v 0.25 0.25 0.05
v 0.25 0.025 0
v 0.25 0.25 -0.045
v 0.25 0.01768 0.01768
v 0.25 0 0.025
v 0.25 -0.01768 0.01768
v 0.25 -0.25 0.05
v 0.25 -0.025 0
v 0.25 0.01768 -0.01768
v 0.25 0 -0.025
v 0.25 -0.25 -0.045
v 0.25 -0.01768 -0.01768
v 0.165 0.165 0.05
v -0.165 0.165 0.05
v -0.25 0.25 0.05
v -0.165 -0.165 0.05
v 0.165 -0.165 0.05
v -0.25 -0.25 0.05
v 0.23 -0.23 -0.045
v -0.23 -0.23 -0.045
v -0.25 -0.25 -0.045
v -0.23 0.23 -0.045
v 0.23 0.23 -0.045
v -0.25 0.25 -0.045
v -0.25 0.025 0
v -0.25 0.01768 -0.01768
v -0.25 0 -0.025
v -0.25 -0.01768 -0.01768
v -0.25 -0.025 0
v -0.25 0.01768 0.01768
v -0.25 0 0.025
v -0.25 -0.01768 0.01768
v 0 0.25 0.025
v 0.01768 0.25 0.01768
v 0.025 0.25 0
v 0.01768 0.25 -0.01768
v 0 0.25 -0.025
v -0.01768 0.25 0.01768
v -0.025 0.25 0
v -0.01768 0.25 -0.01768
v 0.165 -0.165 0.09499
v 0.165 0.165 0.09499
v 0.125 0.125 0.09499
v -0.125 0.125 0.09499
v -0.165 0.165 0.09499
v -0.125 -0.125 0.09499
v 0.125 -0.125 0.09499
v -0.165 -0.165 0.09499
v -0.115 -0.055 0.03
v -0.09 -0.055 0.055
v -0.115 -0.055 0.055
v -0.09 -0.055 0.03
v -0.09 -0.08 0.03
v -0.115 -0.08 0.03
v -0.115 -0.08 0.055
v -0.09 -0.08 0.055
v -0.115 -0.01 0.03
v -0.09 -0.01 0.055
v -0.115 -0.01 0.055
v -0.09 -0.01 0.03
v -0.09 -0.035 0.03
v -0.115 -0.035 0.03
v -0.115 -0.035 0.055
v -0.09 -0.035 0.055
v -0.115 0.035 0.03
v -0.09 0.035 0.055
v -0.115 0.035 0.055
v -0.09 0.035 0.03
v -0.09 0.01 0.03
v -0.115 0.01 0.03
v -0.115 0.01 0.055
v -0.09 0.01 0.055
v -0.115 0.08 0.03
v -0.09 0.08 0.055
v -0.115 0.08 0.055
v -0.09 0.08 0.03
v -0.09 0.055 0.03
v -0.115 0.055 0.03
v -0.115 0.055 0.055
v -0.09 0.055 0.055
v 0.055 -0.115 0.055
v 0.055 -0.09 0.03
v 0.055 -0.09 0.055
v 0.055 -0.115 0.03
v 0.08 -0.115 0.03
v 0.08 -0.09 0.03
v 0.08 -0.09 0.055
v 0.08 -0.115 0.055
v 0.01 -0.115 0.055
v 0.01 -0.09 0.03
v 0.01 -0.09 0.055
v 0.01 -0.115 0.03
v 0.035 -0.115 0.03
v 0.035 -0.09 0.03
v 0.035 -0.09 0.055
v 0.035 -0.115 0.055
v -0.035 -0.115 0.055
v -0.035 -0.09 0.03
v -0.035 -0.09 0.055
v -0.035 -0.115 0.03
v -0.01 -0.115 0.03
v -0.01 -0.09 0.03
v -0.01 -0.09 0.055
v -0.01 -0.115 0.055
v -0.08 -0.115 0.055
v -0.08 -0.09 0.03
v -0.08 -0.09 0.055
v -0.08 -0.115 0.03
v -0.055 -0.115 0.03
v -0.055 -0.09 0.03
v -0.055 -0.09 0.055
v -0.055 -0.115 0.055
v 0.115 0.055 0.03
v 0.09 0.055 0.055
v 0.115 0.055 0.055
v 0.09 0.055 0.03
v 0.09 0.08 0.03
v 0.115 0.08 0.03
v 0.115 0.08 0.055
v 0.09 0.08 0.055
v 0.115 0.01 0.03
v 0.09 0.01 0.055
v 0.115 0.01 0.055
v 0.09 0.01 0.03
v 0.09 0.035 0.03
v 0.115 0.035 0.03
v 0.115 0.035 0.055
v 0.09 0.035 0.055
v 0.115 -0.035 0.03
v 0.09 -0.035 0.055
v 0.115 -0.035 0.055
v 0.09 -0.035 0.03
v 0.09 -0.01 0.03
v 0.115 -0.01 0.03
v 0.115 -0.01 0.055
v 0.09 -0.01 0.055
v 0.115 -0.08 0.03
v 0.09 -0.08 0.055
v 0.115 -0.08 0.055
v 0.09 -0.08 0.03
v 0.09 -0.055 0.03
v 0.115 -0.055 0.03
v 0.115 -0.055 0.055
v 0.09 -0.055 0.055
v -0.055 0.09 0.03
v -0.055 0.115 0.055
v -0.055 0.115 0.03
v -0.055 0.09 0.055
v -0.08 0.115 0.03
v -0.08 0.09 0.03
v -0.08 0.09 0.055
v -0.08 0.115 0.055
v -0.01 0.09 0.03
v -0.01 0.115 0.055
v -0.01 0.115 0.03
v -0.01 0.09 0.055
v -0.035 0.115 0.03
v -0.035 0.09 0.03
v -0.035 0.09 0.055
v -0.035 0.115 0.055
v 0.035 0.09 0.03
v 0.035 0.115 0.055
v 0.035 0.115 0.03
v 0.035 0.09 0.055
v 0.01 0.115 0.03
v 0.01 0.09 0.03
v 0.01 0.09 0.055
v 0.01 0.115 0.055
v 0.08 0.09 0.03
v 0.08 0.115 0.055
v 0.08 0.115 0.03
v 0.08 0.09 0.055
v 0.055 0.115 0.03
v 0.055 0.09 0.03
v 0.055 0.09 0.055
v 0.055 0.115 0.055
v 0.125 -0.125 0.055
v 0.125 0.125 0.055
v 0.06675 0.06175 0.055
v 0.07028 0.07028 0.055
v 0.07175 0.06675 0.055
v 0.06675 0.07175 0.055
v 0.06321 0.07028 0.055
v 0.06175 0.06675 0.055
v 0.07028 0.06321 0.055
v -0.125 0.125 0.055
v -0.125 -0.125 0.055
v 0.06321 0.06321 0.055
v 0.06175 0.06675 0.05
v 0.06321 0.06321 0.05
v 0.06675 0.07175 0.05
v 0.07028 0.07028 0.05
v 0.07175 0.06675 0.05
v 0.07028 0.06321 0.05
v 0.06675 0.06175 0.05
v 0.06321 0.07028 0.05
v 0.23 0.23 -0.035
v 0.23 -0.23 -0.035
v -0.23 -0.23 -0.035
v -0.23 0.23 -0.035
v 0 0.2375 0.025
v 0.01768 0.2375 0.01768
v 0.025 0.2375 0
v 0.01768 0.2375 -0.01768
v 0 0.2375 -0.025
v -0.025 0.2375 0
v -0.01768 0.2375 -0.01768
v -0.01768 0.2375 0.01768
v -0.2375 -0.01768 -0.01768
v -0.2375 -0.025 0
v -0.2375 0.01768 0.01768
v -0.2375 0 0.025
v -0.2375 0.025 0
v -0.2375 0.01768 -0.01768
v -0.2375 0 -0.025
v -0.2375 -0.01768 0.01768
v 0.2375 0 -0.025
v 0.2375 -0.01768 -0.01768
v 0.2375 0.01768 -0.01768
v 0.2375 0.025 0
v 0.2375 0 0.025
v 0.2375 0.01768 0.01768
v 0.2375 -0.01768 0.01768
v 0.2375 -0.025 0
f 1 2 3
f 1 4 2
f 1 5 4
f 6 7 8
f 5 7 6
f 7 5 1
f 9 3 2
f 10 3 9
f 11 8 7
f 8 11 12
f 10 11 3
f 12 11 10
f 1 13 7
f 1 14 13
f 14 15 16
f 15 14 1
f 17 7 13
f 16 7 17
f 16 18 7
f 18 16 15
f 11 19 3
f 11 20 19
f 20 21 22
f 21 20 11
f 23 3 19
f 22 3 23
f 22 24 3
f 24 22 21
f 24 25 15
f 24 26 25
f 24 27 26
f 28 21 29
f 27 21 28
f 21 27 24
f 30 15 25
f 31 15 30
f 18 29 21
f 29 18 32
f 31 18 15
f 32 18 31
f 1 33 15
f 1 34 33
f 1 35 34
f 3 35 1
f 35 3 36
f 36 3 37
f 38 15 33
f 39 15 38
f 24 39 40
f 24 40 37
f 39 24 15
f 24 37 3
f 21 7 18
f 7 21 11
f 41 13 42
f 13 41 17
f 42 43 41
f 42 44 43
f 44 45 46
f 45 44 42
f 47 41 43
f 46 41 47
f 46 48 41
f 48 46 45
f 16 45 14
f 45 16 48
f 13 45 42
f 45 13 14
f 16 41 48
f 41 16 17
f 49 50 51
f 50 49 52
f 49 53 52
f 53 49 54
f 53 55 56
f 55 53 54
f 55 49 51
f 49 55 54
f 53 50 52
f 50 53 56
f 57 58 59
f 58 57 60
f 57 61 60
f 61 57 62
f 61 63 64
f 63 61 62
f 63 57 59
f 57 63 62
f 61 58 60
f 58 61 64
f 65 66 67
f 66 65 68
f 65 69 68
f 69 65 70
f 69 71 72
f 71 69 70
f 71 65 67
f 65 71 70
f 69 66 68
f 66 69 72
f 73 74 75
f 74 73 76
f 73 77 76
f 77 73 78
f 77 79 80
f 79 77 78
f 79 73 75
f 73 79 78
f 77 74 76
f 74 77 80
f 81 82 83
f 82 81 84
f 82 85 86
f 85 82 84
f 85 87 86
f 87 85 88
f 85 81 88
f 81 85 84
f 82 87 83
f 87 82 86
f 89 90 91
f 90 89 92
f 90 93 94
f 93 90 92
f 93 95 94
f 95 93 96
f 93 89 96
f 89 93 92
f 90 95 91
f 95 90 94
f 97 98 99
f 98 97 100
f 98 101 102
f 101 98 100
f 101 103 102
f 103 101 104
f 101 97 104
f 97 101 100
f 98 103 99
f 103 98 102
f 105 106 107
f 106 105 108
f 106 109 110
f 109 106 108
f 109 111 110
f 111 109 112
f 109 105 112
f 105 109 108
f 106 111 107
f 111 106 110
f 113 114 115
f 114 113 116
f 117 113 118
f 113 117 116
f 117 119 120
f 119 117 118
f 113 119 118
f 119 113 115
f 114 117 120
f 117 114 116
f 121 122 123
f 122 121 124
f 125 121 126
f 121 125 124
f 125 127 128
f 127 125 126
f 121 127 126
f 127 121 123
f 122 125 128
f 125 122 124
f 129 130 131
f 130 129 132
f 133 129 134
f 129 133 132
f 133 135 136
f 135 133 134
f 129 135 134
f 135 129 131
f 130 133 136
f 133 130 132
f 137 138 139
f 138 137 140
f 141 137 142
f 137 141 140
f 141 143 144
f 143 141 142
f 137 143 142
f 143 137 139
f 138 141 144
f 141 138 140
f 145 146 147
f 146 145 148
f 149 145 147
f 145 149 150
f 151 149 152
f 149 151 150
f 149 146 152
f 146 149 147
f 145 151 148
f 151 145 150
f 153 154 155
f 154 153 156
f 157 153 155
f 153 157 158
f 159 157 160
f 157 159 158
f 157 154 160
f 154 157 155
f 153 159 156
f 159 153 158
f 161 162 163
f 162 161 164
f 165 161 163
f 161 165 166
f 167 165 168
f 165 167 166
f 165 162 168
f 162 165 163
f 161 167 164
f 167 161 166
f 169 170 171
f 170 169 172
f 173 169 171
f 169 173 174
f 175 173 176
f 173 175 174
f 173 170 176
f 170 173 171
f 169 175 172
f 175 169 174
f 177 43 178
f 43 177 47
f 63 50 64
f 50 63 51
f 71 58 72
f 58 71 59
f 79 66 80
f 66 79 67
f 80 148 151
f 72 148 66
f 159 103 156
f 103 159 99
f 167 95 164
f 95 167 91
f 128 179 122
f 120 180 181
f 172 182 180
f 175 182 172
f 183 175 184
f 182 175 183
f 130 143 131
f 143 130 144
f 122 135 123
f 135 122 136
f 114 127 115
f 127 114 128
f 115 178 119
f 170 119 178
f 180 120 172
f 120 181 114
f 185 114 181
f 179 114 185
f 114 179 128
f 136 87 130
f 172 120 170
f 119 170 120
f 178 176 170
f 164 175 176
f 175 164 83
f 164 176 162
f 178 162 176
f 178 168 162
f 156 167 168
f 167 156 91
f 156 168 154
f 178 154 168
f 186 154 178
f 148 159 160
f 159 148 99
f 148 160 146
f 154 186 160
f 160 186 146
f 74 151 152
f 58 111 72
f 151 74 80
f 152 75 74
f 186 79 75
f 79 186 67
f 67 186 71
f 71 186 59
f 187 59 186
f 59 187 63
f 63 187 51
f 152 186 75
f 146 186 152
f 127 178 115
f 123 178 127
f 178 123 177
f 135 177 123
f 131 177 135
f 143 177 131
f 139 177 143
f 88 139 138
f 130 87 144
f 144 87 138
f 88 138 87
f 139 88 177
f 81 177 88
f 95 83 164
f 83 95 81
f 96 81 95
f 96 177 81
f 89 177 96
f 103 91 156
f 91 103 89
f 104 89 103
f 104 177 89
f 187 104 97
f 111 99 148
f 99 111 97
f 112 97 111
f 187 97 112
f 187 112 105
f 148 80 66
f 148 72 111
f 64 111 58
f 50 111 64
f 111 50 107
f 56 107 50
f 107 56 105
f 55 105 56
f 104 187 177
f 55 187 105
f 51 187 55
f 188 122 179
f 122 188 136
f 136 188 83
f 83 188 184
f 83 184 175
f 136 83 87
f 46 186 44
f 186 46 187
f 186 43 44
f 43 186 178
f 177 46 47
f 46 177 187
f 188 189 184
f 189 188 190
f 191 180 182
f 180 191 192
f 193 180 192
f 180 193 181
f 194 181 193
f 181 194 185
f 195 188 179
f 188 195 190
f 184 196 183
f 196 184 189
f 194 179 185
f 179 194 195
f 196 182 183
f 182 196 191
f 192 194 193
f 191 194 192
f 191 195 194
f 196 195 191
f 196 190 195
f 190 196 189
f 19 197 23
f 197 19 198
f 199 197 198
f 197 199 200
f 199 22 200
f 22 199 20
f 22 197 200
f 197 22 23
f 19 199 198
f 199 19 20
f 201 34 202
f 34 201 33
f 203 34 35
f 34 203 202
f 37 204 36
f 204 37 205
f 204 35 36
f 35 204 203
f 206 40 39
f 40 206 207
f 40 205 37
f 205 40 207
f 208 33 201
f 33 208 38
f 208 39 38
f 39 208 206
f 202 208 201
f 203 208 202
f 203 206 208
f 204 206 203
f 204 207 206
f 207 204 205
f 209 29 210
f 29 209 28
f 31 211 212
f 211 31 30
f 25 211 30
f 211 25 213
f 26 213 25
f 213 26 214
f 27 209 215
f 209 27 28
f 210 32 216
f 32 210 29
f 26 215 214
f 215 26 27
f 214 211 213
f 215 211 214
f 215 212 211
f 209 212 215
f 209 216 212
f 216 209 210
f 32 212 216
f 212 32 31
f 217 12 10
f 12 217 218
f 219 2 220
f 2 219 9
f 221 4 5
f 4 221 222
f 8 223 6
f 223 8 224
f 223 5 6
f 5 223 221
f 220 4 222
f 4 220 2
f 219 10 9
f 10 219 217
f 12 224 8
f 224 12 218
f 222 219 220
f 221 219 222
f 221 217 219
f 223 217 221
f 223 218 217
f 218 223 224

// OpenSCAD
// file: DataSymbol.scad
boxSize = 0.029;
lineSize = 0.0045;
symDepth = 0.01;
vertSeparation = 0.019;
horizSeparation = 0.018;

module DataSymbol() {
  boxVertCenter = (boxSize+vertSeparation)/2;
  boxHorizCenter = (boxSize+horizSeparation)/2;
  linear_extrude(symDepth, center=true) {
    translate([0,boxVertCenter]) square(boxSize, center=true); // top box
    translate([-boxHorizCenter,-boxVertCenter]) square(boxSize, center=true); // bottom left box
    translate([boxHorizCenter,-boxVertCenter]) square(boxSize, center=true); // bottom right box
    square([2*boxHorizCenter + lineSize, lineSize], center=true); // middle line
    translate([0, horizSeparation/4]) square([lineSize, horizSeparation/2 + lineSize], center=true); // line to top
    translate([-boxHorizCenter, -horizSeparation/4]) square([lineSize, horizSeparation/2 + lineSize], center=true); // line to bottom left
    translate([boxHorizCenter, -horizSeparation/4]) square([lineSize, horizSeparation/2 + lineSize], center=true); // line to bottom right
  }
}

DataSymbol();
// file: PowerSymbol.scad
symWidth = 0.038;
symHeight = 0.086;
symDepth = 0.01;
middleHeight = 0.0075;
topHorizOffset = 0.007;
sideVertOffset = 0.007;

module PowerSymbol() {
  linear_extrude(symDepth, center=true) {
    halfHei = symHeight/2;
    halfWid = symWidth/2;
    halfMid = middleHeight/2;
    polygon([
      [topHorizOffset, halfHei],
      [0, halfMid],
      [halfWid, sideVertOffset],
      [-topHorizOffset, -halfHei],
      [0, -halfMid],
      [-halfWid, -sideVertOffset]
    ]);
  }
}

PowerSymbol();
// file: BasicFPGAHousing_paintcap.scad
include <FPGA_shared.scad>;
use <BasicFPGAHousing_base.scad>;

module BasicFPGAHousing_paintcap() {
  bevelDepth = capBevel * sqrt(2);
  difference() {
    translate([0,0,baseTop]) {
      cube(size=[capSize, capSize, capDepth*2], center=true);
    }
    cube(size=[slotSize+eps, slotSize+eps, smallGridSize], center=true);
    for (edge=[1:4]) rotate([0,0,90*edge]) {
      translate([0,capSize/2,baseTop+capDepth]) rotate([45,0,0])
        cube(size=[capSize+0.1, bevelDepth, bevelDepth*2], center=true);
    }
  }
}

%BasicFPGAHousing_base();
BasicFPGAHousing_paintcap();
// file: BasicFPGAHousing_base.scad
include <FPGA_shared.scad>;
use <BasicFPGAHousing_paintcap.scad>;
use <PowerSymbol.scad>;
use <DataSymbol.scad>;

module BasicFPGAHousing_chipcutout() {
  slotPinBaseOffset = (-slotPinEdgeCount-1)/2 * slotPinEdgeSpacing;
  slotPinEdgeOffset = slotSize/2 - slotPinSize/2 - slotPinEdgePad;
  union() {
    translate([0, 0, baseDepth/2 + slotBottom + slotPinDepth]) {
      cube(size=[slotSize, slotSize, baseDepth], center=true);
    }
    for(edge=[1:4]) rotate([0,0,90*edge]) {
      for(i=[1:slotPinEdgeCount]) {
        translate([
          slotPinBaseOffset + slotPinEdgeSpacing*i,
          slotPinEdgeOffset,
          slotBottom + slotPinDepth
        ]) {
          cube(size=[slotPinSize, slotPinSize, slotPinDepth*2], center=true);
        }
      }
    }
    translate([alignHoleOffset,alignHoleOffset,slotBottom + slotPinDepth])
      cylinder(h=alignHoleDepth*2, r=alignHoleRadius, center=true, $fn=alignHoleSides);
  }
}

module BasicFPGAHousing_base() {
  middleSize = (slotSize + capSize) / 2;
  difference() {
    union() {
      translate([0,0,baseCenter])
        cube(size=[baseSize, baseSize, baseDepth], center=true);
      translate([0,0,baseTop-eps])
        cube(size=[middleSize, middleSize, capDepth*2], center=true);
    }
    translate([0,0,baseBottom])
      cube(size=[baseBackCutoutSize, baseBackCutoutSize, baseBackCutoutDepth*2], center=true);
    BasicFPGAHousing_chipcutout();
  }
}

BasicFPGAHousing_base();
%BasicFPGAHousing_paintcap();
// file: FPGA_shared.scad
smallGridSize = 0.5;
baseSize = smallGridSize;
baseTop = 0.05;
baseBottom = -0.045;
baseDepth = baseTop - baseBottom;
baseCenter = (baseTop + baseBottom)/2;
baseBackRim = 0.02;
baseBackCutoutSize = baseSize - baseBackRim*2;
baseBackCutoutDepth = 0.01;
capSize = 0.41;
capDepth = 0.045;
capBevel = 0.01;
slotSize = smallGridSize * 0.5;
slotBottom = 0.03;
slotPinEdgeCount = 4;
slotPinEdgePad = 0.01;
slotPinEdgeSpacing = 0.045;
slotPinSize = 0.025;
slotPinDepth = 0.025;
eps = 0.00001;
chipTotalSize = slotSize - slotPinEdgePad*2 - slotPinSize/2;
chipTotalHeight = 0.1;
chipBaseHeight = 0.05;
pinHorizLength = 0.022;
pinHorizUnderLength = 0.008;
pinHorizWidth = 0.02;
pinHorizHeight = 0.015;
pinVertInnerOffset = 0.003;
pinVertOuterOffset = 0.003;
pinVertNarrowOffset = 0.003;
pinTotalHeight = chipTotalHeight - chipBaseHeight/2 + pinHorizHeight/2;
chipBaseSize = chipTotalSize - pinHorizLength*2;
chipBaseBevelSize = 0.005;
alignHoleRadius = 0.005;
alignHoleOffset = chipBaseSize/2 - 0.02;
alignHoleDepth = 0.005;
alignHoleSides = 8;
decoPinCount = 8;
decoPinWidth = 0.036;
decoPinLength = 0.034;
decoPinHeight = 0.028;
decoPinSpacing = 0.049;
decoPinBevelSize = 0.010;

module cablecutout() {
  cableradius = 0.025;
  cableDepth = 0.0125;
  translate([0,smallGridSize/2,0]) rotate([90,0,0]) {
    cylinder(h=cableDepth*2, r=cableradius, center=true, $fn=8);
  }
}
// main file
include <FPGA_shared.scad>;
use <BasicFPGAHousing_base.scad>;
use <BasicFPGAHousing_paintcap.scad>;
use <PowerSymbol.scad>;
use <DataSymbol.scad>;

module BasicFPGAHousing_readerbase() {
  difference() {
    BasicFPGAHousing_base();
    cablecutout();
    rotate([0,0,90]) cablecutout();
    rotate([0,0,-90]) cablecutout();
  }
}

BasicFPGAHousing_readerbase();
%BasicFPGAHousing_paintcap();
%translate([0.067,0.25,-0.001]) rotate([-90, 0, 0]) PowerSymbol();
%translate([-0.25,0.073,0.001]) rotate([90, 0, 90]) DataSymbol();
%translate([0.25,0.073,0.001]) rotate([90, 0, -90]) DataSymbol();
